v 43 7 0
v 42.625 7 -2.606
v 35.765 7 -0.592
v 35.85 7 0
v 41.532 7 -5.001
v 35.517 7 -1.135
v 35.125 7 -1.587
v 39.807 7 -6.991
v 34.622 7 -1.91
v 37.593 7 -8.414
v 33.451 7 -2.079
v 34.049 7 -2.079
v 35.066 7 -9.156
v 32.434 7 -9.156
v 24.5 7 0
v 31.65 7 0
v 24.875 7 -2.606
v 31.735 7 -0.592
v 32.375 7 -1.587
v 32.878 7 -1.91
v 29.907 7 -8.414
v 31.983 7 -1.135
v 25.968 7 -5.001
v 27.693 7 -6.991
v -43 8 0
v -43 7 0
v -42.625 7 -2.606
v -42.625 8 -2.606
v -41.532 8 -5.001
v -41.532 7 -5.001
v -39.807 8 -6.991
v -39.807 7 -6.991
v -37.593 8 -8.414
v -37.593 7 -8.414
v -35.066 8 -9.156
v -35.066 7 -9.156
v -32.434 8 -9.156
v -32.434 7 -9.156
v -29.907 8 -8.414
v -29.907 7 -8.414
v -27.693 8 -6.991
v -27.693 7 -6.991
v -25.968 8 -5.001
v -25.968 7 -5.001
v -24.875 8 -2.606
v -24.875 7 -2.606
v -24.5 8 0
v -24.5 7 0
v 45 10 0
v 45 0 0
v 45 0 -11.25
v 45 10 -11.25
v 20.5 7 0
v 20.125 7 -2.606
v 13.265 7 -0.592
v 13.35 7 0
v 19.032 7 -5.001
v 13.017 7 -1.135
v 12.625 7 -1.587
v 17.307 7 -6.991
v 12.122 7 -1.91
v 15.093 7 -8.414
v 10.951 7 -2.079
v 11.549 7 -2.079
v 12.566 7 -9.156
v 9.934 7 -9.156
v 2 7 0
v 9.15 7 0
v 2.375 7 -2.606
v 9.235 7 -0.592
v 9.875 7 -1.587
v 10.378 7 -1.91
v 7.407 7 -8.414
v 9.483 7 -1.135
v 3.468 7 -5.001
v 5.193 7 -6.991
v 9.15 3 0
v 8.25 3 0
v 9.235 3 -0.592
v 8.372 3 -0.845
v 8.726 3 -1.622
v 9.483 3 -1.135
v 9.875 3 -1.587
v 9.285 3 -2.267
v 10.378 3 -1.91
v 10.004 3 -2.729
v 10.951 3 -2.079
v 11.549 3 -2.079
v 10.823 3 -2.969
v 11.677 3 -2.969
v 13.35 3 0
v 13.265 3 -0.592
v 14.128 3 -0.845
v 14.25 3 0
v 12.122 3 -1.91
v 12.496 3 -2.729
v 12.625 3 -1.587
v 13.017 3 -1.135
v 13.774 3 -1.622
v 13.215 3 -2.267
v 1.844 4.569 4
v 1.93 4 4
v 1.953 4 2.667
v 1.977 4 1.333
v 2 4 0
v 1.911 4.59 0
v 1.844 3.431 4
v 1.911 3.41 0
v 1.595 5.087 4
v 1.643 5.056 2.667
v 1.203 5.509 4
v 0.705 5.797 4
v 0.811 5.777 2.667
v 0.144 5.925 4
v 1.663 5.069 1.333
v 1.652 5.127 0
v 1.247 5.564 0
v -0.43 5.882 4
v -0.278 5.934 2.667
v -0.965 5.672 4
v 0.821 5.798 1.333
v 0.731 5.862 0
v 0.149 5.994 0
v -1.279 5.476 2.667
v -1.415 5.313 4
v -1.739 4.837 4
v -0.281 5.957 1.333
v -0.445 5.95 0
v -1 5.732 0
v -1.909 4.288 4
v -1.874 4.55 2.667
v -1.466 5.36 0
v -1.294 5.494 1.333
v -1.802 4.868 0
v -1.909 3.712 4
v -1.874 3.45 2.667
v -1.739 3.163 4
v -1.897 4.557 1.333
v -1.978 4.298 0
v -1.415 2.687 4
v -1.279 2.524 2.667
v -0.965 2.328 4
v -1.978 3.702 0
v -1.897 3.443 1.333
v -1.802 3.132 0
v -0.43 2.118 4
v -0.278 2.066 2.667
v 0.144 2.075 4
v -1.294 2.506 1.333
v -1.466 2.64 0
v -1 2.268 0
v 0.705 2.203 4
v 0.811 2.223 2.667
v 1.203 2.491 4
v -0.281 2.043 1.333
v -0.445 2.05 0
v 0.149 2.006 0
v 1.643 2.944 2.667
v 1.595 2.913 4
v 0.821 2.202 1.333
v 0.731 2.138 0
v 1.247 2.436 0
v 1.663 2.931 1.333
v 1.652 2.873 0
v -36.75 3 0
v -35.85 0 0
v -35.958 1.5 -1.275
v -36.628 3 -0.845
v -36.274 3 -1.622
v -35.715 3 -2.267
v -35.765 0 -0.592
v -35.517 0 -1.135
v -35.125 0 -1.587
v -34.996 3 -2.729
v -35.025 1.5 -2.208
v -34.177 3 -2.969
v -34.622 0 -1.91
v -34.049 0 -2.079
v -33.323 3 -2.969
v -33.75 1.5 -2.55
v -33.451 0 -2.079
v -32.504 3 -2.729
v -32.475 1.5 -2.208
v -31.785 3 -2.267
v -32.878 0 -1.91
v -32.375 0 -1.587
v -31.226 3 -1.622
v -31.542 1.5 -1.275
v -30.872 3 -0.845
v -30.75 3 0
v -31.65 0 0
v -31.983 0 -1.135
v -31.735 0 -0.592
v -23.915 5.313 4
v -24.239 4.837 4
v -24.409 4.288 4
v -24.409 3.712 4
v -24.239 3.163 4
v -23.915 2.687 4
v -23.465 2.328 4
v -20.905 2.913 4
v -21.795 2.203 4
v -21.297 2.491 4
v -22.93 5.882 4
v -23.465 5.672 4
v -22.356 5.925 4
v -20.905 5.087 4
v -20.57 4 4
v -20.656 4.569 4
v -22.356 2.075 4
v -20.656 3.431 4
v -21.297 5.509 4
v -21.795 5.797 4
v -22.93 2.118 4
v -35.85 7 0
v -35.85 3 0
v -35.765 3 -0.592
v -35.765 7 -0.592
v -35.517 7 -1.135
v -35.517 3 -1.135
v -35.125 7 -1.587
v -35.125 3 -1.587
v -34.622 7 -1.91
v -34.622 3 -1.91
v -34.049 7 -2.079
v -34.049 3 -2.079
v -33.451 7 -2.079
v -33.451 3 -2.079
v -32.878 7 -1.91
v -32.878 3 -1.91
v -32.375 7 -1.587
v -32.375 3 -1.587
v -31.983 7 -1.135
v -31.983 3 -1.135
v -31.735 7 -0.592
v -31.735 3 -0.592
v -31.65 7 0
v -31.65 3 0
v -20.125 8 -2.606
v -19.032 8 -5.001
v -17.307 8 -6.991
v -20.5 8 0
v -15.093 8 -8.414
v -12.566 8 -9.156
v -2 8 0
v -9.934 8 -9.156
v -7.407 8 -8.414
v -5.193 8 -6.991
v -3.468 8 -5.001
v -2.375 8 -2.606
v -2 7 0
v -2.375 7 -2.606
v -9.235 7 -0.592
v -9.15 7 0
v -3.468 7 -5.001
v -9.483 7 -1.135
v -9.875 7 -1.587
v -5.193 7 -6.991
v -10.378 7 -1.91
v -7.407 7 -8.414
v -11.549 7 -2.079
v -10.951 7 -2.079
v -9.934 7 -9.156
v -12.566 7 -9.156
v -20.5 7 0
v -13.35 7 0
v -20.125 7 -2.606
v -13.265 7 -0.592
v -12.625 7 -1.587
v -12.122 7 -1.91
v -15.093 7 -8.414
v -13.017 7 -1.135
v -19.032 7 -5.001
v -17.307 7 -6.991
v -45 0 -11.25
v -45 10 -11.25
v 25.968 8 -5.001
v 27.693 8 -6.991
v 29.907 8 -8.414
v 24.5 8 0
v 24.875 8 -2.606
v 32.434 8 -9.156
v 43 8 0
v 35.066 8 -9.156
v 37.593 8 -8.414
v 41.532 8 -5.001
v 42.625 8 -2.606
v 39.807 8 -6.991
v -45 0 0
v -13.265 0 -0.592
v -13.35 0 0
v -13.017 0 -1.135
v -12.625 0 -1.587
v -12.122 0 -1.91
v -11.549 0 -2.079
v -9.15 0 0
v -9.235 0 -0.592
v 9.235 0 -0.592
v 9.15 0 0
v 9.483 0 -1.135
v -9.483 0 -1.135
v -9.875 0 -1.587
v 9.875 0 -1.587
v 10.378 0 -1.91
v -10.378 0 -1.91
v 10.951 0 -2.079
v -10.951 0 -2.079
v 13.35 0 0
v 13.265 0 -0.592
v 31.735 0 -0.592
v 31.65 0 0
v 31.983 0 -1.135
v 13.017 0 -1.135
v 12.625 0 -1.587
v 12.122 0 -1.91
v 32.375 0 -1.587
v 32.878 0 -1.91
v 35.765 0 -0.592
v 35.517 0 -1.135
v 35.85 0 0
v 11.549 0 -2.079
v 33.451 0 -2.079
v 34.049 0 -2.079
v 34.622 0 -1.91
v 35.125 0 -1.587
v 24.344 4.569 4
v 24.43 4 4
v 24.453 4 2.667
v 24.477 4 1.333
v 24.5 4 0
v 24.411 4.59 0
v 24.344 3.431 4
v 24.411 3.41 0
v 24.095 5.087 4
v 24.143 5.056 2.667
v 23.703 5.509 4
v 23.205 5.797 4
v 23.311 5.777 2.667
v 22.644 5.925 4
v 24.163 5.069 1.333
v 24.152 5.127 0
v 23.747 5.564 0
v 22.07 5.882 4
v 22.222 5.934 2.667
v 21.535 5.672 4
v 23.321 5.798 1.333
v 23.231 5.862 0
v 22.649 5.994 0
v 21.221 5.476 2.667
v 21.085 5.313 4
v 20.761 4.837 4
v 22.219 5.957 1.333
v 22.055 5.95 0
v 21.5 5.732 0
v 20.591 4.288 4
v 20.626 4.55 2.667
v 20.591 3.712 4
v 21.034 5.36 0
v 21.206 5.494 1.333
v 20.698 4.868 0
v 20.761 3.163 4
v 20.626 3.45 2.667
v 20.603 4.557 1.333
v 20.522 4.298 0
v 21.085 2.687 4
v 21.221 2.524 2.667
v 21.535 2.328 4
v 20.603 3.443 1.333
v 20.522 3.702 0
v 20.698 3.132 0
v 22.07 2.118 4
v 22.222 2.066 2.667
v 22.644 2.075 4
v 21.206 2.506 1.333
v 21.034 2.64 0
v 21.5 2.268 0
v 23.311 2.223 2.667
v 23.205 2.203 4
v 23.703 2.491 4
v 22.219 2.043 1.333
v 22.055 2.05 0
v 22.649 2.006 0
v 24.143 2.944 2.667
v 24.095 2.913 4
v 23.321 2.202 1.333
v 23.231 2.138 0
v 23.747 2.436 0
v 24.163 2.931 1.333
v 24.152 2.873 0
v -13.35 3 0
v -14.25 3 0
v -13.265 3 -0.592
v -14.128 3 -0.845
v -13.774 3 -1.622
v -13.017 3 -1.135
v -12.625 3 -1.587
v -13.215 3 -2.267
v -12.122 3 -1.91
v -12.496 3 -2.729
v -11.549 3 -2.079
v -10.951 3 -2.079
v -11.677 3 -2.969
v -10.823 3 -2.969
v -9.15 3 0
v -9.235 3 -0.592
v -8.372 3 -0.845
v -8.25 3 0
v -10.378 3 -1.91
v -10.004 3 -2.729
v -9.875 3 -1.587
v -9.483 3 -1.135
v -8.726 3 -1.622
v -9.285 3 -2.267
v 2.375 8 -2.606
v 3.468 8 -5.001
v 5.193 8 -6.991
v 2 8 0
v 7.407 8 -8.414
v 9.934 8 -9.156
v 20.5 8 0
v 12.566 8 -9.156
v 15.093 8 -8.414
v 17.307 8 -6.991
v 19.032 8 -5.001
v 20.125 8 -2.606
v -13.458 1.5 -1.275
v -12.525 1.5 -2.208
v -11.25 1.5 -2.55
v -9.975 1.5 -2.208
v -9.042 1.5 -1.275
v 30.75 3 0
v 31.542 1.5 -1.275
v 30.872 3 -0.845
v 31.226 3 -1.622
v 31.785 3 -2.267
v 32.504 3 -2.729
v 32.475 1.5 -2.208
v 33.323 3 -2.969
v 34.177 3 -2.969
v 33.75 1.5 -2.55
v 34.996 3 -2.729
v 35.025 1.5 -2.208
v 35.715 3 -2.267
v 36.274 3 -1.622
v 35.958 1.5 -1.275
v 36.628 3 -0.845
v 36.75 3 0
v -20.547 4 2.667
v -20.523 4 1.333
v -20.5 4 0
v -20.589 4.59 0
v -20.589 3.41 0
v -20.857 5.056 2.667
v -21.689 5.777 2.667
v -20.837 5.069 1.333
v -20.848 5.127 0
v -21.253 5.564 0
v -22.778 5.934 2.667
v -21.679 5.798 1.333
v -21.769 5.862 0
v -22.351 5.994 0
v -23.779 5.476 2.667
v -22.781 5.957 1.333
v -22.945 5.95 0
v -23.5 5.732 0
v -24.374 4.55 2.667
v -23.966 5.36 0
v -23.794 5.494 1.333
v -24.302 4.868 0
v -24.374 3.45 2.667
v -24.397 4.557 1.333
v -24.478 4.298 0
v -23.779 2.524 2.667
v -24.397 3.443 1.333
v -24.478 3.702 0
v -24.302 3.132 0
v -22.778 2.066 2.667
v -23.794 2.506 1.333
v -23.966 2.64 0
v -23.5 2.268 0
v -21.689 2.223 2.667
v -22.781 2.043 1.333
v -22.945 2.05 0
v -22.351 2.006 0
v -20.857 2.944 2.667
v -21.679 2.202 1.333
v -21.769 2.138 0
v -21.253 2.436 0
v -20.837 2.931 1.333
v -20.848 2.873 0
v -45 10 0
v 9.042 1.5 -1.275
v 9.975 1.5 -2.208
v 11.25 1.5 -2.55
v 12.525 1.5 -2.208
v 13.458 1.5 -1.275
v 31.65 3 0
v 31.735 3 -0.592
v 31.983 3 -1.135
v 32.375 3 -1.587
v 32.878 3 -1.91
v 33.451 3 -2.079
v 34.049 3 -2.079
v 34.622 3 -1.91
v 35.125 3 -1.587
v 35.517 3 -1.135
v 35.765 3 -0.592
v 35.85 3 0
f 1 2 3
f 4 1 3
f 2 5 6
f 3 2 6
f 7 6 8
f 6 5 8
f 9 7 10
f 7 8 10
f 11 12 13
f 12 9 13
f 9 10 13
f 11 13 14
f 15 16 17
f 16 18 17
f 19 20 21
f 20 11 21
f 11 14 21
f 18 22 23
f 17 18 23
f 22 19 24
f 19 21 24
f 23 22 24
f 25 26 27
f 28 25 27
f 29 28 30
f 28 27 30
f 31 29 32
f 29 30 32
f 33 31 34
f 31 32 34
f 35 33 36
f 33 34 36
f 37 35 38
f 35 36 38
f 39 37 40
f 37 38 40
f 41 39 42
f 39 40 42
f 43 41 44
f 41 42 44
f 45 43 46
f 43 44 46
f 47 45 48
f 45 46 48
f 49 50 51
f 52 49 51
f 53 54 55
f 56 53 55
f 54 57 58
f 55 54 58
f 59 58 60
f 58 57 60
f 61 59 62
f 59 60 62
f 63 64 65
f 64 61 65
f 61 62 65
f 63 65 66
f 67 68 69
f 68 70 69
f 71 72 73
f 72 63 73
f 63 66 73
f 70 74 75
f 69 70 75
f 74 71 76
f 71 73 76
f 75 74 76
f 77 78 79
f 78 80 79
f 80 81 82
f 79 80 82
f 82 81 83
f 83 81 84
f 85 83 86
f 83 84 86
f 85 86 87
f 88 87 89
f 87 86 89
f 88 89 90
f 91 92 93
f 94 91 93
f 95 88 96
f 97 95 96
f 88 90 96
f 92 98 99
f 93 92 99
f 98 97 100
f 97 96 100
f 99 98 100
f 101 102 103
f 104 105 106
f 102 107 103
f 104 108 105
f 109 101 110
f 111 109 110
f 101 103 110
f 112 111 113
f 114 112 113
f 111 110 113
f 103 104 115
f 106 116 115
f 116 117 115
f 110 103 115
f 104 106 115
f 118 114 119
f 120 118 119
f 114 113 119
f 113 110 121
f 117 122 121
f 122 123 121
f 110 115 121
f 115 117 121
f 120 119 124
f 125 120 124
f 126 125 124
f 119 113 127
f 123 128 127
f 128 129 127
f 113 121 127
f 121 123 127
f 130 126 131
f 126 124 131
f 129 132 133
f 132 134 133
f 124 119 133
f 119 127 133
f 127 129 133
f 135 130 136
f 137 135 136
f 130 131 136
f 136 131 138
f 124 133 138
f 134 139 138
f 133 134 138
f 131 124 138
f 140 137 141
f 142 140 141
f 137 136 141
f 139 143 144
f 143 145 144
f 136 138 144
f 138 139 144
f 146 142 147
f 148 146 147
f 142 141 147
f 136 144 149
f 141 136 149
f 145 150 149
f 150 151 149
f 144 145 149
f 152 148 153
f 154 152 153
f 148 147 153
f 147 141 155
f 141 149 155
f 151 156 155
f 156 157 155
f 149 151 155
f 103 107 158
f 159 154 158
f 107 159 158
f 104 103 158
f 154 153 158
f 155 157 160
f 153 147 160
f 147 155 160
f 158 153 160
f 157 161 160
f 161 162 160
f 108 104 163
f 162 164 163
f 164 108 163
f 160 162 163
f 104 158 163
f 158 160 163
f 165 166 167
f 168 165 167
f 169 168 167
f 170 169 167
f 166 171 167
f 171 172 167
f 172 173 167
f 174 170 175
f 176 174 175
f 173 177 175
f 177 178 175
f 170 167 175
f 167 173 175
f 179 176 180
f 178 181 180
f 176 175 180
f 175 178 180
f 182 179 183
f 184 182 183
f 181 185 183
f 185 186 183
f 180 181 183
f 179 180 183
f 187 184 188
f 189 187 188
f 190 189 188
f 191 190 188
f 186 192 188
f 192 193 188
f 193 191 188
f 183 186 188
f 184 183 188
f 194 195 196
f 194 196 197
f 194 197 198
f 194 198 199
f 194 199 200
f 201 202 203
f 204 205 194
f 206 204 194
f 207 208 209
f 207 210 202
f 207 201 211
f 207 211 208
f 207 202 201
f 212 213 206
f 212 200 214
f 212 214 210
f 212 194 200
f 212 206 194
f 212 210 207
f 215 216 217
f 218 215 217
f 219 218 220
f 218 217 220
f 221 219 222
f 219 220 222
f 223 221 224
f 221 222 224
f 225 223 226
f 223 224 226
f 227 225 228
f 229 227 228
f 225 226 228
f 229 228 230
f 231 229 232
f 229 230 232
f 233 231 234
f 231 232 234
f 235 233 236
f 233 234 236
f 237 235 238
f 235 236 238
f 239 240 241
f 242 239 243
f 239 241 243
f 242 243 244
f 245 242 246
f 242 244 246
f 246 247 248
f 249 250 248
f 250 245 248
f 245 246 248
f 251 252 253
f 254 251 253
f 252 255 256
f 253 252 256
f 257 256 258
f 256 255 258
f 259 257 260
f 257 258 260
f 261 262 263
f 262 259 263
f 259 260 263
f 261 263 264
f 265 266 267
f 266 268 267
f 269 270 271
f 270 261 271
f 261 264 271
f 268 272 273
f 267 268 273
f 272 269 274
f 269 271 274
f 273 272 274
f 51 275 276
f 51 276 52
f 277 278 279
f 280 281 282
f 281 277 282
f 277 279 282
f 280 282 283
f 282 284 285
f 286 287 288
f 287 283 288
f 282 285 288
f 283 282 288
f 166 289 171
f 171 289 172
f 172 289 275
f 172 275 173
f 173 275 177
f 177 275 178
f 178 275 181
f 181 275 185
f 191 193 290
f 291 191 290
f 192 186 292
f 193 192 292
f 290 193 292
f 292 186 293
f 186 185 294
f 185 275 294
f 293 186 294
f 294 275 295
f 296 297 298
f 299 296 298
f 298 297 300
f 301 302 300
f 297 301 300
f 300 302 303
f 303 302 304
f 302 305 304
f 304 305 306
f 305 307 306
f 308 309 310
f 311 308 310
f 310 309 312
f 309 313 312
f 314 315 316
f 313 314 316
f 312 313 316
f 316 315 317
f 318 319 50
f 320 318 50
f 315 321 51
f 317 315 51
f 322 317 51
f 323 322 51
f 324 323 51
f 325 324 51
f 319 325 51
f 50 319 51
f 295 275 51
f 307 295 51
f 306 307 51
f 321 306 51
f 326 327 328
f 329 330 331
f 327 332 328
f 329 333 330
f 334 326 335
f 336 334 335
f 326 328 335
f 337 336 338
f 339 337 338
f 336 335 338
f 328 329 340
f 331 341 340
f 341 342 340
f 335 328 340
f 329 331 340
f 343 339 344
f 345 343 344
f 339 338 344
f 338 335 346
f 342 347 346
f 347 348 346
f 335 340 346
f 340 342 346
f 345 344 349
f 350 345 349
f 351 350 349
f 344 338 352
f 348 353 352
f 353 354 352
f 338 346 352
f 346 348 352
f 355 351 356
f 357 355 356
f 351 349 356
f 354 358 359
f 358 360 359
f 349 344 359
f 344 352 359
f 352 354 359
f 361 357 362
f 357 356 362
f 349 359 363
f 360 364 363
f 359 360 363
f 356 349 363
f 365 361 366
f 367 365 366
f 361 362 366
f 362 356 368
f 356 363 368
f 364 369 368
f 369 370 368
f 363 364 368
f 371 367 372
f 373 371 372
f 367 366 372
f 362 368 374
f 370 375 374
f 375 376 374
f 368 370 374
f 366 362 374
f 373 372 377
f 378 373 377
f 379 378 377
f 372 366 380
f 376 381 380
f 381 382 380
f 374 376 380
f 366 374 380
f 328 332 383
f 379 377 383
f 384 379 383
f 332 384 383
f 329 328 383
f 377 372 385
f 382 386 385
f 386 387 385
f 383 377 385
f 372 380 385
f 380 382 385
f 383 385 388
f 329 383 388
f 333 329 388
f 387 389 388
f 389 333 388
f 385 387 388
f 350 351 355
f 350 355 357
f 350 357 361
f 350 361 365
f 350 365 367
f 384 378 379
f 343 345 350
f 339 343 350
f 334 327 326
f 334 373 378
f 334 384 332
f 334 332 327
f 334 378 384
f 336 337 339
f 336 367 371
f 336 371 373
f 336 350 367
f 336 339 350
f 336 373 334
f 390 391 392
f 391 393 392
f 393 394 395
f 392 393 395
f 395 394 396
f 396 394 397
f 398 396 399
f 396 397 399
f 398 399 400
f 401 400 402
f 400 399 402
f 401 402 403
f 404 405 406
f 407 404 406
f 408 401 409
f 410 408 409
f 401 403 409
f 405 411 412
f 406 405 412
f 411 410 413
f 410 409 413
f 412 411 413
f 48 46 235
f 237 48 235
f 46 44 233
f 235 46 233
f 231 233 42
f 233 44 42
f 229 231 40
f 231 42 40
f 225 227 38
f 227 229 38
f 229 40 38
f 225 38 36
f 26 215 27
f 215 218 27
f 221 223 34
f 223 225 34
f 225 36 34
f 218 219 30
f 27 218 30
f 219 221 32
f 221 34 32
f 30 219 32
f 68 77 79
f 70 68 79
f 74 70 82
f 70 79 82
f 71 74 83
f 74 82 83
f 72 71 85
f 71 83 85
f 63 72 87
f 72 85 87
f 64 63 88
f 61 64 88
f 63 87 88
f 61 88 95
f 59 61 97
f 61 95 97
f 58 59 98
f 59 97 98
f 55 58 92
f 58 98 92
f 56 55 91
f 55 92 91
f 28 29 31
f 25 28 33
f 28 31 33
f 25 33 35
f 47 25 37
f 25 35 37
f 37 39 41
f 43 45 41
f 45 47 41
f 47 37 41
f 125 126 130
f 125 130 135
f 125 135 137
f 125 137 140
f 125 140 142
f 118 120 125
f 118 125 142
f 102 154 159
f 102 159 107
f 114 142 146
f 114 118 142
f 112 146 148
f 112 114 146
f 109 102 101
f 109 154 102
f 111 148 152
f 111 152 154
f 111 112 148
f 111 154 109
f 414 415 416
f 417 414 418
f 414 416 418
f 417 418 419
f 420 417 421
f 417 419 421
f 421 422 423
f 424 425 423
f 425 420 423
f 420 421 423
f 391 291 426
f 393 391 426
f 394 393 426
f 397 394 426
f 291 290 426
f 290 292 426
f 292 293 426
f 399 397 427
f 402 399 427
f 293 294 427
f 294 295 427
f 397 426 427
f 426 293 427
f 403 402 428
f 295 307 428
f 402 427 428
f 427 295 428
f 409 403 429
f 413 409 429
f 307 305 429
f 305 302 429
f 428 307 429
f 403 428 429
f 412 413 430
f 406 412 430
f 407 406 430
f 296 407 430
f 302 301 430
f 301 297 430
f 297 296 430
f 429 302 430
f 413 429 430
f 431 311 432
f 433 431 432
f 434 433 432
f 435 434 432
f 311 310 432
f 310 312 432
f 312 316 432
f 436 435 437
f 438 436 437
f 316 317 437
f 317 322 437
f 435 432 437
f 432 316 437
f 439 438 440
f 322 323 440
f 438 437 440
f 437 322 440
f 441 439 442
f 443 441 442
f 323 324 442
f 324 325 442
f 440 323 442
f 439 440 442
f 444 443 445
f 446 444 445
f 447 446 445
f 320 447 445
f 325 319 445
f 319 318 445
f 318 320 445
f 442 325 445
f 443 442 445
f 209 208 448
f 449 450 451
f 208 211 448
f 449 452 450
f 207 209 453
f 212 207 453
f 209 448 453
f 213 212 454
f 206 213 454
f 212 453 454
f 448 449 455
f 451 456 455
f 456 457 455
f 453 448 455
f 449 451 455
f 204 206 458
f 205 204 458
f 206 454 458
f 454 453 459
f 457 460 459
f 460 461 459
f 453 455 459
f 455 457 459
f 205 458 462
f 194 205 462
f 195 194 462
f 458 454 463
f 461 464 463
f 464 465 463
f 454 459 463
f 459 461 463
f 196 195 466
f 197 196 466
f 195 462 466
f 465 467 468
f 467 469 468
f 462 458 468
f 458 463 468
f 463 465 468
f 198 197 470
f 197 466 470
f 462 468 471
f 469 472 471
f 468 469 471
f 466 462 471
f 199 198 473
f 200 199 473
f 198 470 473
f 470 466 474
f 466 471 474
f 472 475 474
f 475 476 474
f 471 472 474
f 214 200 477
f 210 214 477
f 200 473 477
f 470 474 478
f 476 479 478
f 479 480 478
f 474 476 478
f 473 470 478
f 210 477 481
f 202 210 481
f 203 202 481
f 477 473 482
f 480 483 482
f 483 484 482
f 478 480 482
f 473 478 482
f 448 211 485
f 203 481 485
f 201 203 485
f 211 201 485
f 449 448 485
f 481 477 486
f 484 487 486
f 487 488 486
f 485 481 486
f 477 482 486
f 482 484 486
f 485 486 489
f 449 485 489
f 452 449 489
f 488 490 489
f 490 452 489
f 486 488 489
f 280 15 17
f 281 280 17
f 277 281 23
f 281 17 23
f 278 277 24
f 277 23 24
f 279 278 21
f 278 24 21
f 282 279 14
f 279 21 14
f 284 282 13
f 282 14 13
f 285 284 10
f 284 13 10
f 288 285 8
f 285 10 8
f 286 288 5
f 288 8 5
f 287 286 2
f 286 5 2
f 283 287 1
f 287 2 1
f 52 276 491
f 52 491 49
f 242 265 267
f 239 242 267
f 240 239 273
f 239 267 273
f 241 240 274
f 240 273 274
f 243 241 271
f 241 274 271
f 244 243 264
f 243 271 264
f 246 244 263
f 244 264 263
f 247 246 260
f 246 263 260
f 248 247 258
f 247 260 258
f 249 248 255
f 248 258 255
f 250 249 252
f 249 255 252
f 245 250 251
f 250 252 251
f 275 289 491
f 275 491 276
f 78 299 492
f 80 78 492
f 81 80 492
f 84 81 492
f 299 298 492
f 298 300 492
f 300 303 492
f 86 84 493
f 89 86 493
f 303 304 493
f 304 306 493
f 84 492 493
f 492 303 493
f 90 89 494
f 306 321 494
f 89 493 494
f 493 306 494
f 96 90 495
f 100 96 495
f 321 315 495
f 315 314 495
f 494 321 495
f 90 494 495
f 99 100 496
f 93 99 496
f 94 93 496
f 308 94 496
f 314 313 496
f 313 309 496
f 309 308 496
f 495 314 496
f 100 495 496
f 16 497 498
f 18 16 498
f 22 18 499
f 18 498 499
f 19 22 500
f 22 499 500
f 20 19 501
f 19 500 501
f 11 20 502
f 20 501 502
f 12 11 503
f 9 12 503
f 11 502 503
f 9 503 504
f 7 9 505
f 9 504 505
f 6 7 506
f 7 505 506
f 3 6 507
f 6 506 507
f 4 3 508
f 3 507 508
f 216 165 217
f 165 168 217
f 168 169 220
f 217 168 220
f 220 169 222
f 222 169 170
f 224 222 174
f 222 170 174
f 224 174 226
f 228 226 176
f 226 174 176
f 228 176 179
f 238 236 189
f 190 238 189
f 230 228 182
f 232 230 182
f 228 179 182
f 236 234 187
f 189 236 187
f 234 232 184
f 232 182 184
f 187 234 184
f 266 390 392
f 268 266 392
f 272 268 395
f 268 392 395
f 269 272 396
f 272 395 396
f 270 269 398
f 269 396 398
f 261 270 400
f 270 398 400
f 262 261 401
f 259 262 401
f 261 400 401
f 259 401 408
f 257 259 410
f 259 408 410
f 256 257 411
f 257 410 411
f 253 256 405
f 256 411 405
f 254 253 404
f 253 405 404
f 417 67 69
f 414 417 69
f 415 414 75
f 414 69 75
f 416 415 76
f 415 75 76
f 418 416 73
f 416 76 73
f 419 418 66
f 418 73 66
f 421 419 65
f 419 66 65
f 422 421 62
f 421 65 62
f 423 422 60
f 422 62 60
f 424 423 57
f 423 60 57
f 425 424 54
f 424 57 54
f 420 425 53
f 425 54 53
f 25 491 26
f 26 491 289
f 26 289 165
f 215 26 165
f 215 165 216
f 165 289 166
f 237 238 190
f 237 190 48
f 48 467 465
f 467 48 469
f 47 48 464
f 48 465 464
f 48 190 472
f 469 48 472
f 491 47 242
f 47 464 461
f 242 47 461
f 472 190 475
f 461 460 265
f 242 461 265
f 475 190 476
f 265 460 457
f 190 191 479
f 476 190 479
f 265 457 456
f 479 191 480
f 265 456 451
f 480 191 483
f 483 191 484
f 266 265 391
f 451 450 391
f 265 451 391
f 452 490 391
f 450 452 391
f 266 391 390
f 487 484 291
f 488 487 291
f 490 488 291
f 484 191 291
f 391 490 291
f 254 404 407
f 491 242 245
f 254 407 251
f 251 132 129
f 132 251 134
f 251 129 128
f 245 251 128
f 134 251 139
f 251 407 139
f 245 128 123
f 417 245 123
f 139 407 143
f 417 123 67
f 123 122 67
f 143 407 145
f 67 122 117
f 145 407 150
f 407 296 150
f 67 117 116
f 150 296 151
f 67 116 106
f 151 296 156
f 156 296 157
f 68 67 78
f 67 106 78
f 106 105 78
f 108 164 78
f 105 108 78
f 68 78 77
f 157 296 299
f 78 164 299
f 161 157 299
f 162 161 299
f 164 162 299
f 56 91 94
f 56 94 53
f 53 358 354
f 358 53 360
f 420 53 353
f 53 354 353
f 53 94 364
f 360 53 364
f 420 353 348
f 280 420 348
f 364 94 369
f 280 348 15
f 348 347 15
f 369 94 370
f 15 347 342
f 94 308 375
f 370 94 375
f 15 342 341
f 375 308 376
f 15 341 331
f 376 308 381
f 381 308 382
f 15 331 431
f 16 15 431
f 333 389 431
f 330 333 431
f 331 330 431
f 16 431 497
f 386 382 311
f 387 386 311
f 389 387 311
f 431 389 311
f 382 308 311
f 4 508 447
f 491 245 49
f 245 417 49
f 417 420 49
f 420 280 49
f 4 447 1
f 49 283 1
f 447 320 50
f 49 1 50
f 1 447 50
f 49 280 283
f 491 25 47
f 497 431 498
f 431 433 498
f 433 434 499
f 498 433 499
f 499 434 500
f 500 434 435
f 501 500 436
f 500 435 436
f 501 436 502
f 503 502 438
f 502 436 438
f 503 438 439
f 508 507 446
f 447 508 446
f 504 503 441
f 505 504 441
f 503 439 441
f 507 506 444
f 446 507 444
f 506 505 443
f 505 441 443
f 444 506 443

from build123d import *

# Parameters (mm, degrees)
SKETCH1_W           = 90
SKETCH1_H           = 11.25
BOSS_EXTRUDE1_DEPTH = 10
LPATTERN1_COUNT     = 4
LPATTERN1_PITCH     = 22.5
SKETCH3_R           = 2
BOSS_EXTRUDE2_DEPTH = 4
DRAFT1_ANGLE        = 1


with BuildPart() as part:
    # Sketch1 → Boss-Extrude1 (new body)
    with BuildSketch(Plane(origin=(0, 0, 0), x_dir=(1, 0, 0), z_dir=(0, 1, 0))):
        with Locations((0, 5.625)):
            Rectangle(SKETCH1_W, SKETCH1_H)
    extrude(amount=BOSS_EXTRUDE1_DEPTH)

    # Sketch2 → Cut-Revolve1 (revolve, cut)
    with BuildSketch(Plane.XY):
        Polygon((-33.75, 8), (-43, 8), (-43, 7), (-35.85, 7), (-35.85, 3), (-36.75, 3), (-35.85, 0), (-33.75, 0), align=None)
    cut_revolve1 = revolve(axis=Axis((-33.75, 16.960495744, 0), (0, -1, 0)), mode=Mode.SUBTRACT)

    # LPattern1: Cut-Revolve1 ×4
    with Locations(*[(i * LPATTERN1_PITCH, 0, 0) for i in range(1, LPATTERN1_COUNT)]):
        add(cut_revolve1, mode=Mode.SUBTRACT)

    # Sketch3 → Boss-Extrude2 (add)
    with BuildSketch(Plane.XY):
        with Locations((-22.5, 4)):
            Circle(SKETCH3_R)
        with Locations((0, 4)):
            Circle(SKETCH3_R)
        with Locations((22.5, 4)):
            Circle(SKETCH3_R)
    extrude(amount=BOSS_EXTRUDE2_DEPTH)

    # Draft1
    draft1_faces = [part.faces().sort_by_distance(p)[0] for p in [
        (20.5, 4, 2),
        (-2, 4, 2),
        (-24.5, 4, 2),
    ]]
    draft(draft1_faces, Plane(origin=(-45, 10, 0), x_dir=(1, 0, 0), z_dir=(0, 0, 1)), DRAFT1_ANGLE)


solid = part.part
